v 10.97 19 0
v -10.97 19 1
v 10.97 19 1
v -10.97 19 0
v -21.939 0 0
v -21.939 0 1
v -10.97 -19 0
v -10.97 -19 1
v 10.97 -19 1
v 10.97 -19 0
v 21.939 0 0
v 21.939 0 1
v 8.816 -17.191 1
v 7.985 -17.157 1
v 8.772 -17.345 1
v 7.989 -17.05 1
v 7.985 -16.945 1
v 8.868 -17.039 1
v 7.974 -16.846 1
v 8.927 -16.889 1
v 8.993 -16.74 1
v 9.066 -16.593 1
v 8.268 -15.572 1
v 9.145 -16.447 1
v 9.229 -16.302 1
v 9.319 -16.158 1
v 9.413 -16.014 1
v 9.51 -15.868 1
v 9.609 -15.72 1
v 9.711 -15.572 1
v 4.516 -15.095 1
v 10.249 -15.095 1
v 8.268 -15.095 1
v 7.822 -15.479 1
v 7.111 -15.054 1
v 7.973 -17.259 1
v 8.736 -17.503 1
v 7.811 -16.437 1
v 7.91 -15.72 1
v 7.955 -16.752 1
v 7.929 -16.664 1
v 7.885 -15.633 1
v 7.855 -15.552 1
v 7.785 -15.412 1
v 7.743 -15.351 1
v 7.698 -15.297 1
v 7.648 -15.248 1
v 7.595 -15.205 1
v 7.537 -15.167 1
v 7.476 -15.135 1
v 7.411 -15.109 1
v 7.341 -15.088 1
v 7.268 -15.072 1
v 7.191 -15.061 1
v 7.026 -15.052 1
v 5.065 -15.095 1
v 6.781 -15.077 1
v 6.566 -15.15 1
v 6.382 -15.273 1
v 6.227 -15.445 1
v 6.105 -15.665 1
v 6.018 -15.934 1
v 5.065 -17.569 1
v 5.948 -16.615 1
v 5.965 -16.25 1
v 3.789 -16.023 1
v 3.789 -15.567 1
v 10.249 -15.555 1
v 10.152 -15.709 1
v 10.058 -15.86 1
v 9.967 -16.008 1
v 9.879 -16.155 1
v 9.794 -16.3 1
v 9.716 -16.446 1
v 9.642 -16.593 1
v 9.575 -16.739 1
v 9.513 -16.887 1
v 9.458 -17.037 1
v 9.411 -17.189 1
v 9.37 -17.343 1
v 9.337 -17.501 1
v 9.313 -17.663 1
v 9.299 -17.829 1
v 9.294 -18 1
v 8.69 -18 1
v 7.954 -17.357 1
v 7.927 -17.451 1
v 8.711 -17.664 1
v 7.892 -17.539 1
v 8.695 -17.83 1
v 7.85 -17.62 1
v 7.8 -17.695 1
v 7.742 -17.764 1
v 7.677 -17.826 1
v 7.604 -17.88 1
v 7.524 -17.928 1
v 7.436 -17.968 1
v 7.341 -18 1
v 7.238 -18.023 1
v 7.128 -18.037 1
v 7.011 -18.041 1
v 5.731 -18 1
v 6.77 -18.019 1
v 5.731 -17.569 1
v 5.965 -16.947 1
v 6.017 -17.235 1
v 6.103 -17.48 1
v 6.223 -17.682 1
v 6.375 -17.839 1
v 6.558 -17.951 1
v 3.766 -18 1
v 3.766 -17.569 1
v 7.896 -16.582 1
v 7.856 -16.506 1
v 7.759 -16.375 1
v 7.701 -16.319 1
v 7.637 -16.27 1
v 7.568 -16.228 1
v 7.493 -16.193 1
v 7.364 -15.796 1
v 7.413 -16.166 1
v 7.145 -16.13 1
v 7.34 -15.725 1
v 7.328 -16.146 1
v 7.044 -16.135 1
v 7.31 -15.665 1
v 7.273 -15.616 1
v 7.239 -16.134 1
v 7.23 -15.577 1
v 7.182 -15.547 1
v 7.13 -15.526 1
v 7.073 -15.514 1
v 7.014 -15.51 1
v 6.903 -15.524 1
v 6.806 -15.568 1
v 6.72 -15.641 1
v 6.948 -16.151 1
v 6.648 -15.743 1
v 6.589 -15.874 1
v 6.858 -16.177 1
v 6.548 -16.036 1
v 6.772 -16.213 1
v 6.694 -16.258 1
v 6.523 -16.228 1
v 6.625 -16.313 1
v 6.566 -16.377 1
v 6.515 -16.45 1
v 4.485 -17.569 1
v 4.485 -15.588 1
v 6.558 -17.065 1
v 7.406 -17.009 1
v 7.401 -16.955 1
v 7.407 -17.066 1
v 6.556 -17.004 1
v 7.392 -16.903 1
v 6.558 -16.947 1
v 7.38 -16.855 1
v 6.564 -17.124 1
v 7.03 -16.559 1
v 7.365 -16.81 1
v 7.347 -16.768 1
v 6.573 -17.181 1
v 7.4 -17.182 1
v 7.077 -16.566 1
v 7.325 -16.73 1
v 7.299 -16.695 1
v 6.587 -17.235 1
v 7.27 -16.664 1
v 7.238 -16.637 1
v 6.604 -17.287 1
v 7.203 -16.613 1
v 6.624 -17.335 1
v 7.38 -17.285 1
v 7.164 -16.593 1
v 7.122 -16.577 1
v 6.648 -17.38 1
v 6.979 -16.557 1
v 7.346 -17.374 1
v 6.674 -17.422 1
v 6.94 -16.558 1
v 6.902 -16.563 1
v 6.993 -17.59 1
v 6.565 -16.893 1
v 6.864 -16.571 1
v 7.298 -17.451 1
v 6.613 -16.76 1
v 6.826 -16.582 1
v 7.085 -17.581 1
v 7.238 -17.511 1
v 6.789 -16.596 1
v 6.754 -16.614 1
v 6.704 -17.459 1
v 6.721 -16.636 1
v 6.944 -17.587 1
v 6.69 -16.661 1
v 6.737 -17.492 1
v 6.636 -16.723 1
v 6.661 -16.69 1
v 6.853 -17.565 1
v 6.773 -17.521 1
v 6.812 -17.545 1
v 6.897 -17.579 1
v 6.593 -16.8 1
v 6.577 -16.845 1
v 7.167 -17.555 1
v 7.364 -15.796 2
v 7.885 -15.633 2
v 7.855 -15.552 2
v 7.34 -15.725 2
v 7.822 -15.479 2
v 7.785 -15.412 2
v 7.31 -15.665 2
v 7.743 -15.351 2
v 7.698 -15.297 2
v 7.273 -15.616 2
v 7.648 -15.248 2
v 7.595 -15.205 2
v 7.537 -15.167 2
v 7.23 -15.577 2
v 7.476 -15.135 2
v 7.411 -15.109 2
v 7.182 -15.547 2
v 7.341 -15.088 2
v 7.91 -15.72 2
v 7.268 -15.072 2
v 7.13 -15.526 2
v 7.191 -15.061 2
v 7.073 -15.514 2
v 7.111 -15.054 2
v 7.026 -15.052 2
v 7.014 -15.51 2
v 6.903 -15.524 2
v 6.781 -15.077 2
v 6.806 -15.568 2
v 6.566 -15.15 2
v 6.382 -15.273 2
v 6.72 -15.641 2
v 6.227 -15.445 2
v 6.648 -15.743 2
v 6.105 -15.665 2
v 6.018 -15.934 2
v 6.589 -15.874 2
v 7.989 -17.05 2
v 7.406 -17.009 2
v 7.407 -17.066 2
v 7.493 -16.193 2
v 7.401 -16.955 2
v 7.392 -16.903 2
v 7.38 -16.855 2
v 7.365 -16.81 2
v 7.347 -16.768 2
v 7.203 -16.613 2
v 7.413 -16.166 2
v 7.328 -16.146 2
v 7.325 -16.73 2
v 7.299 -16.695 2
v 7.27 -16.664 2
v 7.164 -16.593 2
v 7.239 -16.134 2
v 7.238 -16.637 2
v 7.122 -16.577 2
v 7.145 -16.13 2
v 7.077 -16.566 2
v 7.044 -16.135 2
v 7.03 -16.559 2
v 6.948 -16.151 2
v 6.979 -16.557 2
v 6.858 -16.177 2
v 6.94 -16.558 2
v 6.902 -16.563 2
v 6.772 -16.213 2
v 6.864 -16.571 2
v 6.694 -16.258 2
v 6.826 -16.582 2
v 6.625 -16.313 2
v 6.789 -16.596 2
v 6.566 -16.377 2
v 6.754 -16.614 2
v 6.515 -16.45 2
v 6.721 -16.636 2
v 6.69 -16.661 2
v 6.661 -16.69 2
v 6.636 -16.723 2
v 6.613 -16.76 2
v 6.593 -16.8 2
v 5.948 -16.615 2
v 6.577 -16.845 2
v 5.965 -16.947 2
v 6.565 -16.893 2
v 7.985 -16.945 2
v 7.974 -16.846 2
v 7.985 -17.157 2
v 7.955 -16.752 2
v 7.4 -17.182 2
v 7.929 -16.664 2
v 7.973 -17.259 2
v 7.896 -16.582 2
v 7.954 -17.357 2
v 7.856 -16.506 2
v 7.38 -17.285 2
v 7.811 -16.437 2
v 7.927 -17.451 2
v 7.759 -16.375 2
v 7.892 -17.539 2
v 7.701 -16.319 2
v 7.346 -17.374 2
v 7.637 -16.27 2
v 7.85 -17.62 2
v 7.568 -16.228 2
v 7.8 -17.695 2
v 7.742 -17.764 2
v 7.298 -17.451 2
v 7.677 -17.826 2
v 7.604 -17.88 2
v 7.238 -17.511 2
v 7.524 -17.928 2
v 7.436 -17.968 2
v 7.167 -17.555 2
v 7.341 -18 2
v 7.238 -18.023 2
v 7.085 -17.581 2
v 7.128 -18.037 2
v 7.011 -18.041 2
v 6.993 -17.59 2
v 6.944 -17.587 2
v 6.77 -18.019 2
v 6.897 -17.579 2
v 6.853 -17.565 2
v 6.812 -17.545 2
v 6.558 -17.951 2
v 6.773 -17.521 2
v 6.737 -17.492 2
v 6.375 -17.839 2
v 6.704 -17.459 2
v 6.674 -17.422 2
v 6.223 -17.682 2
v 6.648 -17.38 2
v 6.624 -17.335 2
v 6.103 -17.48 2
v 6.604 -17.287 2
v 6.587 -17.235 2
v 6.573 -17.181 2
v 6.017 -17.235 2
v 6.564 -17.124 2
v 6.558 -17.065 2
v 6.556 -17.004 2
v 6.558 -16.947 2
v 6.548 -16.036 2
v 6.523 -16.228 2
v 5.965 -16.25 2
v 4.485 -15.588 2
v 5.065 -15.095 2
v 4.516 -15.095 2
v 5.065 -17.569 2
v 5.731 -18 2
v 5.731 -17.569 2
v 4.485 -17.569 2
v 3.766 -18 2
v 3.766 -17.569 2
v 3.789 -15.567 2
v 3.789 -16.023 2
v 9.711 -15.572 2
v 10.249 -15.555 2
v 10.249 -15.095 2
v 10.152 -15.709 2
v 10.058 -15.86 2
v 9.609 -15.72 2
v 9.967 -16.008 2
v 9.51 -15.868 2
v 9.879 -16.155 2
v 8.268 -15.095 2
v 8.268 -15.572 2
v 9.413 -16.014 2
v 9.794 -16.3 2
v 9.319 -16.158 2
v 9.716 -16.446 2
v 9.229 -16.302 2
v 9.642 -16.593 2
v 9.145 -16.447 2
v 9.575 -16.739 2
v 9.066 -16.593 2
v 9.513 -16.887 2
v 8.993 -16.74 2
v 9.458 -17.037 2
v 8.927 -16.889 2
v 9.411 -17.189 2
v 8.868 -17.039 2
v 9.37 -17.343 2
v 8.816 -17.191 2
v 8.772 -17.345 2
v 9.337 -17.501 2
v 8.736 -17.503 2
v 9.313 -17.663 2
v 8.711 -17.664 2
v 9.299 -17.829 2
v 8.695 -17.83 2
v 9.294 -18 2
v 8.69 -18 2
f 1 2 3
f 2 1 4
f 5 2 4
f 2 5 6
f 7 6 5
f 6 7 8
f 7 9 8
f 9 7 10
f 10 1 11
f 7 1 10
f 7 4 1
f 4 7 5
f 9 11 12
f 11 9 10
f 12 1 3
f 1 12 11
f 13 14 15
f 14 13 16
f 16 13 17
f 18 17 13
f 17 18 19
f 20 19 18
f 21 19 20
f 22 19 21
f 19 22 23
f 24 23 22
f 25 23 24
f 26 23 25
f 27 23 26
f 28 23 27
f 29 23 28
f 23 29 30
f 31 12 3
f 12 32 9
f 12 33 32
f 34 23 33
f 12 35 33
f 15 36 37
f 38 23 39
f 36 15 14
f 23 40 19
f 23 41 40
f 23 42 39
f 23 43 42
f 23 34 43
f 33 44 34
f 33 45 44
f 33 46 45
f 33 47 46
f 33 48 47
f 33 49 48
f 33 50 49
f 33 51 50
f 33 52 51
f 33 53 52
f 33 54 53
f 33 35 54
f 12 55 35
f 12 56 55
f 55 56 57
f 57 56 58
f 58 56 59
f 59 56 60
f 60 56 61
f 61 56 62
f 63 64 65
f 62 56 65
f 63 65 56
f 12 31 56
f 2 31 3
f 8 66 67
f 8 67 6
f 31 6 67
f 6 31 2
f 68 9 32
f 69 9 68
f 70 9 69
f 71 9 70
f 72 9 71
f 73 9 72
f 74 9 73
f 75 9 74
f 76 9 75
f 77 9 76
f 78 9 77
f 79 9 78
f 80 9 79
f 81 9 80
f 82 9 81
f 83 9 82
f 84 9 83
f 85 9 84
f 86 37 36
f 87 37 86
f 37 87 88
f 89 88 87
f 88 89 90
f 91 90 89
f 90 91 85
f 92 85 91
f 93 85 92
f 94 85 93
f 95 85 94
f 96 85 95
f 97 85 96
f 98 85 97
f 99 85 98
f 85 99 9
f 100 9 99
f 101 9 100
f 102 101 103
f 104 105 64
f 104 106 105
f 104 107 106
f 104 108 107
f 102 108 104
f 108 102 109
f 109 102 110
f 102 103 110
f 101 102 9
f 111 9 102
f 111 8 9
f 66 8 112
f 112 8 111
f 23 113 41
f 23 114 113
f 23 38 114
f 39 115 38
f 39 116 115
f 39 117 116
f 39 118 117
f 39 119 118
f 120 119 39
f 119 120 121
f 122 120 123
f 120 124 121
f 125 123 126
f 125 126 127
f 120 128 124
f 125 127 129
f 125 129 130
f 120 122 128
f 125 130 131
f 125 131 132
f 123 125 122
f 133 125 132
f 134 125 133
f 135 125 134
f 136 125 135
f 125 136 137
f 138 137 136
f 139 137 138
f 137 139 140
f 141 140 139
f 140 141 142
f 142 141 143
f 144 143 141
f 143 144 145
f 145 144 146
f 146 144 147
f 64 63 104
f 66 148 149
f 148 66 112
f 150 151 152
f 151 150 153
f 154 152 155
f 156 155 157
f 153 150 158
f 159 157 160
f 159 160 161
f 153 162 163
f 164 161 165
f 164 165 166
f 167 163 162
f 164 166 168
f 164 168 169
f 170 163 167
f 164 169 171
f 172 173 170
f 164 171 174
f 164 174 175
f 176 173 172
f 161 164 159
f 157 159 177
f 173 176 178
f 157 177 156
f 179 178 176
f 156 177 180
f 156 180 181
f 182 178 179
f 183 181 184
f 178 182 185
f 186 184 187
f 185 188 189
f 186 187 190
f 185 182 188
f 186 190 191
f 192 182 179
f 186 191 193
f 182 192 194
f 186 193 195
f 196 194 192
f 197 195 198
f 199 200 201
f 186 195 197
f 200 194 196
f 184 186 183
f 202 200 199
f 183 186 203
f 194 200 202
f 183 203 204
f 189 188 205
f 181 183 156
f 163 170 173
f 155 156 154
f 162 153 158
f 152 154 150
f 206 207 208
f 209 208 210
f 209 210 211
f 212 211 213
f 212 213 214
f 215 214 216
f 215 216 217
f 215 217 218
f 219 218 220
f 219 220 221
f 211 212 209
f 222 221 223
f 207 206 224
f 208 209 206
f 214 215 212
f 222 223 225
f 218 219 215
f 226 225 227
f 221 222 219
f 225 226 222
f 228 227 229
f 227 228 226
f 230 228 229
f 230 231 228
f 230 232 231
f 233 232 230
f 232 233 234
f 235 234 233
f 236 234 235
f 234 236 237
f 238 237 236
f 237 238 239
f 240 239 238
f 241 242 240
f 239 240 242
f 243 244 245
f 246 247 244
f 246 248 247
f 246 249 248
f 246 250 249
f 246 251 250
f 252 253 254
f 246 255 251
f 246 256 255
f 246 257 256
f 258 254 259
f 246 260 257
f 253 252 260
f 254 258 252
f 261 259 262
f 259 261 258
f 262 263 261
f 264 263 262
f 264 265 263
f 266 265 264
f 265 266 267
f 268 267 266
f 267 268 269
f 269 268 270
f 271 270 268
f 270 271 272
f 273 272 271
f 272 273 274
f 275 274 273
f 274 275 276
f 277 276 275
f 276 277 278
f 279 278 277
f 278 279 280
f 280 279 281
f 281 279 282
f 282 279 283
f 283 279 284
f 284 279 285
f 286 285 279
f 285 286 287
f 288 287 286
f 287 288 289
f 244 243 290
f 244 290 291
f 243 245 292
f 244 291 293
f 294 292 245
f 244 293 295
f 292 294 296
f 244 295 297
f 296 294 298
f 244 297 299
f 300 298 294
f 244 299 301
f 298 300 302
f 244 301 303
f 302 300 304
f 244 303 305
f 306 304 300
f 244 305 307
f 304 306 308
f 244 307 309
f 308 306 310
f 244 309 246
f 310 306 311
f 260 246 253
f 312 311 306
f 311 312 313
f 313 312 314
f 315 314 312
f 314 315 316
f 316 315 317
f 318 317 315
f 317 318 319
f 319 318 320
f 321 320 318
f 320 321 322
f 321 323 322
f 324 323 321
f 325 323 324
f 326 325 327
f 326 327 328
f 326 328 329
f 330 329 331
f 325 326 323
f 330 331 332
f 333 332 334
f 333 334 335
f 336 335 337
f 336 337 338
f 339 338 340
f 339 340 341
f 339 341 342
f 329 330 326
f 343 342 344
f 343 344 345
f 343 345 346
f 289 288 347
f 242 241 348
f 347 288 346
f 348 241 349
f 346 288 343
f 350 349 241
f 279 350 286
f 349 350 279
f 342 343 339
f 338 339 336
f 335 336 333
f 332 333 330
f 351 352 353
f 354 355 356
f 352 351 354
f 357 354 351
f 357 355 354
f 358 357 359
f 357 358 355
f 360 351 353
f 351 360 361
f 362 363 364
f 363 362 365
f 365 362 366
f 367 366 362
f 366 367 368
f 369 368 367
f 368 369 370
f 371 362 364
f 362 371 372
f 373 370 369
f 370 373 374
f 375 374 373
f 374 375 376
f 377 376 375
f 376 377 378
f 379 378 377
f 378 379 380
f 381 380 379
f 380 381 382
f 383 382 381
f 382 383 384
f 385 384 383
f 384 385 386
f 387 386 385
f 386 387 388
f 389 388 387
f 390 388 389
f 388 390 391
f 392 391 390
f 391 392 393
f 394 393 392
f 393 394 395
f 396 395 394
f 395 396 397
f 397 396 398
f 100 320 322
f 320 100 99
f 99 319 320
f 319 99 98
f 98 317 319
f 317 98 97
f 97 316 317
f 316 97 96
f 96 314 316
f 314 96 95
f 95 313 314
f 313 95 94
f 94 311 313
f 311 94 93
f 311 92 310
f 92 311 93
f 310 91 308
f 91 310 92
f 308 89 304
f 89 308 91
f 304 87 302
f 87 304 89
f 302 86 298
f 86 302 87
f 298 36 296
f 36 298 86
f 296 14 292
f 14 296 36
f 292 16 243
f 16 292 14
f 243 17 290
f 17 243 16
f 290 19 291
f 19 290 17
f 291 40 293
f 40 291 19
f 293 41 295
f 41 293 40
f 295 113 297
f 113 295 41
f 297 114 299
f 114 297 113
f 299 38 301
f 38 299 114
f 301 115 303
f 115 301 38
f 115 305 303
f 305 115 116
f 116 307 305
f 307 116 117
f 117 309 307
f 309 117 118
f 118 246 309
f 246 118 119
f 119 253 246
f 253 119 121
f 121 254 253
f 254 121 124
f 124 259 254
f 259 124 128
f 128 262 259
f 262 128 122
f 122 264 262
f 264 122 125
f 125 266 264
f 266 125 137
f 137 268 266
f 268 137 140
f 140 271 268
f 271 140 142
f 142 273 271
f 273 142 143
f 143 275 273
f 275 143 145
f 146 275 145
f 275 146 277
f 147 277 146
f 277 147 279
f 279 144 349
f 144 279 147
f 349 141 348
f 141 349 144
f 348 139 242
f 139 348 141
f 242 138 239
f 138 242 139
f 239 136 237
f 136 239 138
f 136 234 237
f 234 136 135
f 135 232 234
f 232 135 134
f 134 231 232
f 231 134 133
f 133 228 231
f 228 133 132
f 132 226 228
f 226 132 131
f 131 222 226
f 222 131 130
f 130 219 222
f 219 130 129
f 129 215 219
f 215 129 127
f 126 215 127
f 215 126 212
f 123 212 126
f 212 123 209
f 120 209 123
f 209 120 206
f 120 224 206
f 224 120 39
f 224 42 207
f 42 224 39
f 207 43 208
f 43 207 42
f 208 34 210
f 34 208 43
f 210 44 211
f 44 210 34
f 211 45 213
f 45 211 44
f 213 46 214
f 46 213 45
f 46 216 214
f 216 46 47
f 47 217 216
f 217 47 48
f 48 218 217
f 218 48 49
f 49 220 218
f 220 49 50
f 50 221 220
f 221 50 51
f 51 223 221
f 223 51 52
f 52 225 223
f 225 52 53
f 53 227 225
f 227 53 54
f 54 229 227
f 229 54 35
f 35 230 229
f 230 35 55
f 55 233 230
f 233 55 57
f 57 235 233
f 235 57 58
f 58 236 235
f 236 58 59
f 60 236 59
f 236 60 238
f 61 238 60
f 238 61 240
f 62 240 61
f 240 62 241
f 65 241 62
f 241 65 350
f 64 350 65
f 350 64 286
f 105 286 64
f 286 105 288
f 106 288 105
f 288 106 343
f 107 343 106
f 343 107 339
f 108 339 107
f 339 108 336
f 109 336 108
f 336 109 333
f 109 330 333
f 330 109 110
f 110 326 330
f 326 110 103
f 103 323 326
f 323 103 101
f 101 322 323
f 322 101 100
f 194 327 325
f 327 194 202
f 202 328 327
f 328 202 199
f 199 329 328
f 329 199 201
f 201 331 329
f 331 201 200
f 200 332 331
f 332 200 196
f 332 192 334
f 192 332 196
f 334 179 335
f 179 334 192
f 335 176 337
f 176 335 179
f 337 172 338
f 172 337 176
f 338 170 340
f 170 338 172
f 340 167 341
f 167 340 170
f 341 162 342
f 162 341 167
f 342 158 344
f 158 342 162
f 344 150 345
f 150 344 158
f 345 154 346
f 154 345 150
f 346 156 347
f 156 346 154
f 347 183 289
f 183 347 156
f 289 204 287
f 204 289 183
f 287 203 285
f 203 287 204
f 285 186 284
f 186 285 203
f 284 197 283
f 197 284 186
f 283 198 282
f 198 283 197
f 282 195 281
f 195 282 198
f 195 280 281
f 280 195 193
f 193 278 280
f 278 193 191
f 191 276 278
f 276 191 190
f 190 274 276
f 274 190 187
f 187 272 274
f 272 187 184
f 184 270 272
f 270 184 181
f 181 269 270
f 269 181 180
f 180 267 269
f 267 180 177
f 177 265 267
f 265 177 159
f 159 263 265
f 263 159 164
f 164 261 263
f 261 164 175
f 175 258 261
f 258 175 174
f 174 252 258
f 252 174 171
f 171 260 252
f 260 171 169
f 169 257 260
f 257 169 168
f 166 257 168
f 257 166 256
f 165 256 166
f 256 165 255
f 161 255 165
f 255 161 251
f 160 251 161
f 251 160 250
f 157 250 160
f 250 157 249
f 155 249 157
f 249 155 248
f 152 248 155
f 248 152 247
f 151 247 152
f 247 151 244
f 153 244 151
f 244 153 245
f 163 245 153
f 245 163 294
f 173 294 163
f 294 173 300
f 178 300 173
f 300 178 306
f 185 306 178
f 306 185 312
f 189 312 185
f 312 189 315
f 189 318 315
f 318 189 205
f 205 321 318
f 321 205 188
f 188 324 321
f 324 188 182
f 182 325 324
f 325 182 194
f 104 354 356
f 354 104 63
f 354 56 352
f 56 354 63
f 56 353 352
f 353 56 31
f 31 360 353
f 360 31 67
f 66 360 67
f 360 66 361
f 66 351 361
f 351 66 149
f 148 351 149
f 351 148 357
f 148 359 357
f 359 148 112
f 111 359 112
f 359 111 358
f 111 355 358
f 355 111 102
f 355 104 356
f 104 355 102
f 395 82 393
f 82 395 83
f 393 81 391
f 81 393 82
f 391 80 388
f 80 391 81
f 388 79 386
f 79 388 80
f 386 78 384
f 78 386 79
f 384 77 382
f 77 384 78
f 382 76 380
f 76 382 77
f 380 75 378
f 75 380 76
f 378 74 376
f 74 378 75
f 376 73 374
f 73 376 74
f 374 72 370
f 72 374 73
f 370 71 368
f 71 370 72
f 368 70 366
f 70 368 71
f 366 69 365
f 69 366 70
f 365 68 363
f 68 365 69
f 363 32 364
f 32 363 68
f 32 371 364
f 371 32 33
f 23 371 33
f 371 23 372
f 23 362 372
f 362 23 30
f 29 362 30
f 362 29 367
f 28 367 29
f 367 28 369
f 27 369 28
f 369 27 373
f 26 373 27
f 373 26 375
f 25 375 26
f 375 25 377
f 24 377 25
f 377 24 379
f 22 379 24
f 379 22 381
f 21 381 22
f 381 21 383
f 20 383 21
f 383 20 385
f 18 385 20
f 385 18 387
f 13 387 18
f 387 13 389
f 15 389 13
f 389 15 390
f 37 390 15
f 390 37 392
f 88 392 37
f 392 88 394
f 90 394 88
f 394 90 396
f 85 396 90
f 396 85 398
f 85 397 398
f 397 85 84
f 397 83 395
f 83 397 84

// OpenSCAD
include <../Scripts/18xx tiles basic functions.scad>
hex("Brown");
put_tilenr("167");
